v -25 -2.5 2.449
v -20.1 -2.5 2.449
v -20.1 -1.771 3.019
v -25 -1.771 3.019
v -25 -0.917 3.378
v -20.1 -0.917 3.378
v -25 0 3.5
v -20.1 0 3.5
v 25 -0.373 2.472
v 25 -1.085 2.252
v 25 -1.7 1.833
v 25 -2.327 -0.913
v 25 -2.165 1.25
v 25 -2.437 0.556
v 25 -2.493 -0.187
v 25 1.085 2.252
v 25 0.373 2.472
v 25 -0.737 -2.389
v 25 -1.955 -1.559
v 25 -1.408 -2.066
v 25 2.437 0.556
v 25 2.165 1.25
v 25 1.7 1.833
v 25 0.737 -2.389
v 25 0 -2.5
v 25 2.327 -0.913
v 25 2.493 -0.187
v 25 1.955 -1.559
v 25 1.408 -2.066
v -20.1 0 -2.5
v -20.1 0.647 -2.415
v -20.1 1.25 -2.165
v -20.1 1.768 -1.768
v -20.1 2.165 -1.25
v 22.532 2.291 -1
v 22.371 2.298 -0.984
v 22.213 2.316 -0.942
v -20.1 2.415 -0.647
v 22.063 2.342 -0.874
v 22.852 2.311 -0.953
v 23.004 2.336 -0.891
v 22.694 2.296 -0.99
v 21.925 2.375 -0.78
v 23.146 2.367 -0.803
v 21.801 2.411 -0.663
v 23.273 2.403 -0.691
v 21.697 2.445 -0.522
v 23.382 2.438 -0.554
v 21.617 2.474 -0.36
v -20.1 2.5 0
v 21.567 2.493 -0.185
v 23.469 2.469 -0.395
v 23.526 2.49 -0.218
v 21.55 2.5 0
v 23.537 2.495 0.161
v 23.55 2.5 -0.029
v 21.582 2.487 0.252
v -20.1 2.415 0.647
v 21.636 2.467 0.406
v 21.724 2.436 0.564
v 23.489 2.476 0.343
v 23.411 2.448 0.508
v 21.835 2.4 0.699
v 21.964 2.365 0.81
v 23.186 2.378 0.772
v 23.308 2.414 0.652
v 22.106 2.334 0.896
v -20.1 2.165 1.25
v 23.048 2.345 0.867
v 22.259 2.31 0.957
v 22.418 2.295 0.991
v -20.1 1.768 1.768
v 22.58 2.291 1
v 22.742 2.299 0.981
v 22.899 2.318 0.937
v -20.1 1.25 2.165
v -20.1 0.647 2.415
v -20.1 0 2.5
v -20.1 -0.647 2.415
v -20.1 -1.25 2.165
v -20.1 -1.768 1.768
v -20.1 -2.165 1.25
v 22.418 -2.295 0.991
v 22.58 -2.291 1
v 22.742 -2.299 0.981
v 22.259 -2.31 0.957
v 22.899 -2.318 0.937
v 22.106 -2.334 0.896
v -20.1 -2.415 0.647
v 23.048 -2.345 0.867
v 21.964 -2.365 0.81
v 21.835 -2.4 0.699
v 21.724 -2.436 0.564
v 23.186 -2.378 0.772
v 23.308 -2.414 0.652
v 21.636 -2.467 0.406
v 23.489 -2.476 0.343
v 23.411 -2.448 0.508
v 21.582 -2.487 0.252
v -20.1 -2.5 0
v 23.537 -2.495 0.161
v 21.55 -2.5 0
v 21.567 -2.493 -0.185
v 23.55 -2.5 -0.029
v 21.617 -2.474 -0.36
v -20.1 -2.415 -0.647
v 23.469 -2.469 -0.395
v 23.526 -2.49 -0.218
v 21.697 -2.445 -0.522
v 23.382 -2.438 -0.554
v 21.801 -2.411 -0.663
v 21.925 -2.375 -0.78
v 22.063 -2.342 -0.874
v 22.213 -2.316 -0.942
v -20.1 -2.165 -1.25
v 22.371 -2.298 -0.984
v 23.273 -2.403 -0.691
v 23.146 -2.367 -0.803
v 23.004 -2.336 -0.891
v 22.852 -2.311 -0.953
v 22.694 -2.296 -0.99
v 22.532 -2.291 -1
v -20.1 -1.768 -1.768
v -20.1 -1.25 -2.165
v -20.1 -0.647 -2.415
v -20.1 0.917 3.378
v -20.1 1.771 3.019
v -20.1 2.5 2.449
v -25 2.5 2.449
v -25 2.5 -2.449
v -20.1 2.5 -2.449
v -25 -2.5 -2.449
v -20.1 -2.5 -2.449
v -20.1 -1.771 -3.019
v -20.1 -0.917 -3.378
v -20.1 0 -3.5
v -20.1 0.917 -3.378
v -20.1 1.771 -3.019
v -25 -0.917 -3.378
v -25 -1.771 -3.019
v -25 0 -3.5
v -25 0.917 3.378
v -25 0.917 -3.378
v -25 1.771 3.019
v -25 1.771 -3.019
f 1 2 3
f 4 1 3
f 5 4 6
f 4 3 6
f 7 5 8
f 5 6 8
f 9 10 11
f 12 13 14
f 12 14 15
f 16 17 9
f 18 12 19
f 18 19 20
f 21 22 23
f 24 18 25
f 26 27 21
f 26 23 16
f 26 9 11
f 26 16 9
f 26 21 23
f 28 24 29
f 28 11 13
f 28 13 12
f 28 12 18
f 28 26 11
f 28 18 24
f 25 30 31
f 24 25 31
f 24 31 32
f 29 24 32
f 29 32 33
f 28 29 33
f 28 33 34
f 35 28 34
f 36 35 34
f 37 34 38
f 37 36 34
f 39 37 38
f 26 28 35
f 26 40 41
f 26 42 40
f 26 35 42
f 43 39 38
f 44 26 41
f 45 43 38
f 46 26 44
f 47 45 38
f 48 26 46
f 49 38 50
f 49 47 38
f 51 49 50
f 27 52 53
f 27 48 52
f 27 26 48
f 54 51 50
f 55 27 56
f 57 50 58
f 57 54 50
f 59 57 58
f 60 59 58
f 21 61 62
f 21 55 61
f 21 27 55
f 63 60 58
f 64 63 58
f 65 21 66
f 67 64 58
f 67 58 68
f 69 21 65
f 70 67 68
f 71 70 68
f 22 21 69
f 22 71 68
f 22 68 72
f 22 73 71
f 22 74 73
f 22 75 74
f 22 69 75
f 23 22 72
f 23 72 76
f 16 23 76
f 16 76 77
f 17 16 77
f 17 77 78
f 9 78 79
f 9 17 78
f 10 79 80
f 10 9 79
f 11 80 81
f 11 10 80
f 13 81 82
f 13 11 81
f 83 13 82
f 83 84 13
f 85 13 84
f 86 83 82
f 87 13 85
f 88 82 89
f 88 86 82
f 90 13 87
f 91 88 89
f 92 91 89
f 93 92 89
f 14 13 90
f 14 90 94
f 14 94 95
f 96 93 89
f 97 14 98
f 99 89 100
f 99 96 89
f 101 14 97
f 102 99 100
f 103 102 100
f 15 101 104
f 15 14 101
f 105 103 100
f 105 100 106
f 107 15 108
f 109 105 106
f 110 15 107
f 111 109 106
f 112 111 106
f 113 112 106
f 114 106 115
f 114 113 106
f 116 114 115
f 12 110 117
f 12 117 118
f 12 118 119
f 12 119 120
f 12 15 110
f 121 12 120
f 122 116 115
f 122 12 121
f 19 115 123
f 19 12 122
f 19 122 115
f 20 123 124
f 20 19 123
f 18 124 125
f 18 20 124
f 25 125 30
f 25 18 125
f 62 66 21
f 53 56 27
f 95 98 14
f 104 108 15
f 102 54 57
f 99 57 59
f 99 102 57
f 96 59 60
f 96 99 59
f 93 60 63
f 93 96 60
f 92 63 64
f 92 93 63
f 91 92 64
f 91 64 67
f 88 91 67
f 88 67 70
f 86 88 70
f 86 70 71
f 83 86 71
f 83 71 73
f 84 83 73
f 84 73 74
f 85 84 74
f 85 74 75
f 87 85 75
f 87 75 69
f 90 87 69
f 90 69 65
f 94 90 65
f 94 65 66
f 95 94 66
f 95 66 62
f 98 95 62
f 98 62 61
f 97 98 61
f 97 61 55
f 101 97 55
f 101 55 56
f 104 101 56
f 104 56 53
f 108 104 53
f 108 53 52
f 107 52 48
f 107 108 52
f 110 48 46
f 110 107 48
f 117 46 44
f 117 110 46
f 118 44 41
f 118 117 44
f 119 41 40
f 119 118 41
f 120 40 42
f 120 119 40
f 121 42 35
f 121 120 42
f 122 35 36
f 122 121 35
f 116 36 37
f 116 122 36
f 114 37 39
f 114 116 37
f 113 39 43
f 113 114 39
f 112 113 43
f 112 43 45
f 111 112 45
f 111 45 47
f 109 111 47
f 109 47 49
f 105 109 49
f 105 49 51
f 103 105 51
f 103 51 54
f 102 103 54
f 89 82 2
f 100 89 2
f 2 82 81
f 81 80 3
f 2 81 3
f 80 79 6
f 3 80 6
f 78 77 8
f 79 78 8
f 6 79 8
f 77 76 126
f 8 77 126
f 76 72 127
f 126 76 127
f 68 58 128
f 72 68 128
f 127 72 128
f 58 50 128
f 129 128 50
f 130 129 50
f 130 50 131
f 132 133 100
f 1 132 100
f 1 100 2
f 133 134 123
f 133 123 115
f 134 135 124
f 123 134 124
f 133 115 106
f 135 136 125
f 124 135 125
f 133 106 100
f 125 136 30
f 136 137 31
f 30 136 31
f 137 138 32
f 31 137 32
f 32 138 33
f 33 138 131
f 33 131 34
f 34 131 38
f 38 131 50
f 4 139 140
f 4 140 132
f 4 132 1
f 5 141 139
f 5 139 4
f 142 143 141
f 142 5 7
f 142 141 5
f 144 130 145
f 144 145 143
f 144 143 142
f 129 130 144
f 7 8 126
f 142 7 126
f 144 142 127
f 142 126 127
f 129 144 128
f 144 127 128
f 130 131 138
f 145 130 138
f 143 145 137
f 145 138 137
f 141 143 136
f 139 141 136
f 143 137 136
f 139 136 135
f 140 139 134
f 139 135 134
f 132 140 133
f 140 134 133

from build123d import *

# Parameters (mm, degrees)
SKETCH2_R               = 2.5
BOSS_EXTRUDE1_DEPTH     = 25
BOSS_EXTRUDE4_START     = -4.9
BOSS_EXTRUDE4_DEPTH     = 4.9
CUT_EXTRUDE2_DEPTH      = 26.734218465
CUT_EXTRUDE2_DEPTH_BACK = 26.734218465
SKETCH5_R               = 1


with BuildPart() as part:
    # Sketch2 → Boss-Extrude1 (new, symmetric)
    with BuildSketch(Plane(origin=(0, 0, 0), x_dir=(0, 0, -1), z_dir=(1, 0, 0))):
        Circle(SKETCH2_R)
    extrude(amount=BOSS_EXTRUDE1_DEPTH, both=True)

    # Sketch3 → Boss-Extrude4 (add)
    with BuildSketch(Plane.ZY.offset(25).offset(BOSS_EXTRUDE4_START)):
        with BuildLine():
            Line((0, 2.5), (-2.449489743, 2.5))
            ThreePointArc((-2.449489743, 2.5), (-3.5, 0), (-2.449489743, -2.5))
            Line((-2.449489743, -2.5), (0, -2.5))
            ThreePointArc((0, -2.5), (-2.5, 0), (0, 2.5))
        make_face()
        with BuildLine():
            Line((2.449489743, 2.5), (0, 2.5))
            ThreePointArc((0, 2.5), (1.767766953, 1.767766953), (2.5, 0))
            ThreePointArc((2.5, 0), (1.767766953, -1.767766953), (0, -2.5))
            Line((0, -2.5), (2.449489743, -2.5))
            ThreePointArc((2.449489743, -2.5), (3.226702194, -1.355873501), (3.5, 0))
            ThreePointArc((3.5, 0), (3.226702194, 1.355873501), (2.449489743, 2.5))
        make_face()
    extrude(amount=BOSS_EXTRUDE4_DEPTH)

    # Sketch5 → Cut-Extrude2 (cut, two sides: drawn at the far end of the back side and taken through both)
    with BuildSketch(Plane(origin=(0, 2.5, 0), x_dir=(1, 0, 0), z_dir=(0, 1, 0)).offset(-CUT_EXTRUDE2_DEPTH_BACK)):
        with Locations(Location((22.55, 0, 0), (0, 0, 180.000000001))):
            Circle(SKETCH5_R)
    extrude(amount=CUT_EXTRUDE2_DEPTH + CUT_EXTRUDE2_DEPTH_BACK, mode=Mode.SUBTRACT)


solid = part.part
